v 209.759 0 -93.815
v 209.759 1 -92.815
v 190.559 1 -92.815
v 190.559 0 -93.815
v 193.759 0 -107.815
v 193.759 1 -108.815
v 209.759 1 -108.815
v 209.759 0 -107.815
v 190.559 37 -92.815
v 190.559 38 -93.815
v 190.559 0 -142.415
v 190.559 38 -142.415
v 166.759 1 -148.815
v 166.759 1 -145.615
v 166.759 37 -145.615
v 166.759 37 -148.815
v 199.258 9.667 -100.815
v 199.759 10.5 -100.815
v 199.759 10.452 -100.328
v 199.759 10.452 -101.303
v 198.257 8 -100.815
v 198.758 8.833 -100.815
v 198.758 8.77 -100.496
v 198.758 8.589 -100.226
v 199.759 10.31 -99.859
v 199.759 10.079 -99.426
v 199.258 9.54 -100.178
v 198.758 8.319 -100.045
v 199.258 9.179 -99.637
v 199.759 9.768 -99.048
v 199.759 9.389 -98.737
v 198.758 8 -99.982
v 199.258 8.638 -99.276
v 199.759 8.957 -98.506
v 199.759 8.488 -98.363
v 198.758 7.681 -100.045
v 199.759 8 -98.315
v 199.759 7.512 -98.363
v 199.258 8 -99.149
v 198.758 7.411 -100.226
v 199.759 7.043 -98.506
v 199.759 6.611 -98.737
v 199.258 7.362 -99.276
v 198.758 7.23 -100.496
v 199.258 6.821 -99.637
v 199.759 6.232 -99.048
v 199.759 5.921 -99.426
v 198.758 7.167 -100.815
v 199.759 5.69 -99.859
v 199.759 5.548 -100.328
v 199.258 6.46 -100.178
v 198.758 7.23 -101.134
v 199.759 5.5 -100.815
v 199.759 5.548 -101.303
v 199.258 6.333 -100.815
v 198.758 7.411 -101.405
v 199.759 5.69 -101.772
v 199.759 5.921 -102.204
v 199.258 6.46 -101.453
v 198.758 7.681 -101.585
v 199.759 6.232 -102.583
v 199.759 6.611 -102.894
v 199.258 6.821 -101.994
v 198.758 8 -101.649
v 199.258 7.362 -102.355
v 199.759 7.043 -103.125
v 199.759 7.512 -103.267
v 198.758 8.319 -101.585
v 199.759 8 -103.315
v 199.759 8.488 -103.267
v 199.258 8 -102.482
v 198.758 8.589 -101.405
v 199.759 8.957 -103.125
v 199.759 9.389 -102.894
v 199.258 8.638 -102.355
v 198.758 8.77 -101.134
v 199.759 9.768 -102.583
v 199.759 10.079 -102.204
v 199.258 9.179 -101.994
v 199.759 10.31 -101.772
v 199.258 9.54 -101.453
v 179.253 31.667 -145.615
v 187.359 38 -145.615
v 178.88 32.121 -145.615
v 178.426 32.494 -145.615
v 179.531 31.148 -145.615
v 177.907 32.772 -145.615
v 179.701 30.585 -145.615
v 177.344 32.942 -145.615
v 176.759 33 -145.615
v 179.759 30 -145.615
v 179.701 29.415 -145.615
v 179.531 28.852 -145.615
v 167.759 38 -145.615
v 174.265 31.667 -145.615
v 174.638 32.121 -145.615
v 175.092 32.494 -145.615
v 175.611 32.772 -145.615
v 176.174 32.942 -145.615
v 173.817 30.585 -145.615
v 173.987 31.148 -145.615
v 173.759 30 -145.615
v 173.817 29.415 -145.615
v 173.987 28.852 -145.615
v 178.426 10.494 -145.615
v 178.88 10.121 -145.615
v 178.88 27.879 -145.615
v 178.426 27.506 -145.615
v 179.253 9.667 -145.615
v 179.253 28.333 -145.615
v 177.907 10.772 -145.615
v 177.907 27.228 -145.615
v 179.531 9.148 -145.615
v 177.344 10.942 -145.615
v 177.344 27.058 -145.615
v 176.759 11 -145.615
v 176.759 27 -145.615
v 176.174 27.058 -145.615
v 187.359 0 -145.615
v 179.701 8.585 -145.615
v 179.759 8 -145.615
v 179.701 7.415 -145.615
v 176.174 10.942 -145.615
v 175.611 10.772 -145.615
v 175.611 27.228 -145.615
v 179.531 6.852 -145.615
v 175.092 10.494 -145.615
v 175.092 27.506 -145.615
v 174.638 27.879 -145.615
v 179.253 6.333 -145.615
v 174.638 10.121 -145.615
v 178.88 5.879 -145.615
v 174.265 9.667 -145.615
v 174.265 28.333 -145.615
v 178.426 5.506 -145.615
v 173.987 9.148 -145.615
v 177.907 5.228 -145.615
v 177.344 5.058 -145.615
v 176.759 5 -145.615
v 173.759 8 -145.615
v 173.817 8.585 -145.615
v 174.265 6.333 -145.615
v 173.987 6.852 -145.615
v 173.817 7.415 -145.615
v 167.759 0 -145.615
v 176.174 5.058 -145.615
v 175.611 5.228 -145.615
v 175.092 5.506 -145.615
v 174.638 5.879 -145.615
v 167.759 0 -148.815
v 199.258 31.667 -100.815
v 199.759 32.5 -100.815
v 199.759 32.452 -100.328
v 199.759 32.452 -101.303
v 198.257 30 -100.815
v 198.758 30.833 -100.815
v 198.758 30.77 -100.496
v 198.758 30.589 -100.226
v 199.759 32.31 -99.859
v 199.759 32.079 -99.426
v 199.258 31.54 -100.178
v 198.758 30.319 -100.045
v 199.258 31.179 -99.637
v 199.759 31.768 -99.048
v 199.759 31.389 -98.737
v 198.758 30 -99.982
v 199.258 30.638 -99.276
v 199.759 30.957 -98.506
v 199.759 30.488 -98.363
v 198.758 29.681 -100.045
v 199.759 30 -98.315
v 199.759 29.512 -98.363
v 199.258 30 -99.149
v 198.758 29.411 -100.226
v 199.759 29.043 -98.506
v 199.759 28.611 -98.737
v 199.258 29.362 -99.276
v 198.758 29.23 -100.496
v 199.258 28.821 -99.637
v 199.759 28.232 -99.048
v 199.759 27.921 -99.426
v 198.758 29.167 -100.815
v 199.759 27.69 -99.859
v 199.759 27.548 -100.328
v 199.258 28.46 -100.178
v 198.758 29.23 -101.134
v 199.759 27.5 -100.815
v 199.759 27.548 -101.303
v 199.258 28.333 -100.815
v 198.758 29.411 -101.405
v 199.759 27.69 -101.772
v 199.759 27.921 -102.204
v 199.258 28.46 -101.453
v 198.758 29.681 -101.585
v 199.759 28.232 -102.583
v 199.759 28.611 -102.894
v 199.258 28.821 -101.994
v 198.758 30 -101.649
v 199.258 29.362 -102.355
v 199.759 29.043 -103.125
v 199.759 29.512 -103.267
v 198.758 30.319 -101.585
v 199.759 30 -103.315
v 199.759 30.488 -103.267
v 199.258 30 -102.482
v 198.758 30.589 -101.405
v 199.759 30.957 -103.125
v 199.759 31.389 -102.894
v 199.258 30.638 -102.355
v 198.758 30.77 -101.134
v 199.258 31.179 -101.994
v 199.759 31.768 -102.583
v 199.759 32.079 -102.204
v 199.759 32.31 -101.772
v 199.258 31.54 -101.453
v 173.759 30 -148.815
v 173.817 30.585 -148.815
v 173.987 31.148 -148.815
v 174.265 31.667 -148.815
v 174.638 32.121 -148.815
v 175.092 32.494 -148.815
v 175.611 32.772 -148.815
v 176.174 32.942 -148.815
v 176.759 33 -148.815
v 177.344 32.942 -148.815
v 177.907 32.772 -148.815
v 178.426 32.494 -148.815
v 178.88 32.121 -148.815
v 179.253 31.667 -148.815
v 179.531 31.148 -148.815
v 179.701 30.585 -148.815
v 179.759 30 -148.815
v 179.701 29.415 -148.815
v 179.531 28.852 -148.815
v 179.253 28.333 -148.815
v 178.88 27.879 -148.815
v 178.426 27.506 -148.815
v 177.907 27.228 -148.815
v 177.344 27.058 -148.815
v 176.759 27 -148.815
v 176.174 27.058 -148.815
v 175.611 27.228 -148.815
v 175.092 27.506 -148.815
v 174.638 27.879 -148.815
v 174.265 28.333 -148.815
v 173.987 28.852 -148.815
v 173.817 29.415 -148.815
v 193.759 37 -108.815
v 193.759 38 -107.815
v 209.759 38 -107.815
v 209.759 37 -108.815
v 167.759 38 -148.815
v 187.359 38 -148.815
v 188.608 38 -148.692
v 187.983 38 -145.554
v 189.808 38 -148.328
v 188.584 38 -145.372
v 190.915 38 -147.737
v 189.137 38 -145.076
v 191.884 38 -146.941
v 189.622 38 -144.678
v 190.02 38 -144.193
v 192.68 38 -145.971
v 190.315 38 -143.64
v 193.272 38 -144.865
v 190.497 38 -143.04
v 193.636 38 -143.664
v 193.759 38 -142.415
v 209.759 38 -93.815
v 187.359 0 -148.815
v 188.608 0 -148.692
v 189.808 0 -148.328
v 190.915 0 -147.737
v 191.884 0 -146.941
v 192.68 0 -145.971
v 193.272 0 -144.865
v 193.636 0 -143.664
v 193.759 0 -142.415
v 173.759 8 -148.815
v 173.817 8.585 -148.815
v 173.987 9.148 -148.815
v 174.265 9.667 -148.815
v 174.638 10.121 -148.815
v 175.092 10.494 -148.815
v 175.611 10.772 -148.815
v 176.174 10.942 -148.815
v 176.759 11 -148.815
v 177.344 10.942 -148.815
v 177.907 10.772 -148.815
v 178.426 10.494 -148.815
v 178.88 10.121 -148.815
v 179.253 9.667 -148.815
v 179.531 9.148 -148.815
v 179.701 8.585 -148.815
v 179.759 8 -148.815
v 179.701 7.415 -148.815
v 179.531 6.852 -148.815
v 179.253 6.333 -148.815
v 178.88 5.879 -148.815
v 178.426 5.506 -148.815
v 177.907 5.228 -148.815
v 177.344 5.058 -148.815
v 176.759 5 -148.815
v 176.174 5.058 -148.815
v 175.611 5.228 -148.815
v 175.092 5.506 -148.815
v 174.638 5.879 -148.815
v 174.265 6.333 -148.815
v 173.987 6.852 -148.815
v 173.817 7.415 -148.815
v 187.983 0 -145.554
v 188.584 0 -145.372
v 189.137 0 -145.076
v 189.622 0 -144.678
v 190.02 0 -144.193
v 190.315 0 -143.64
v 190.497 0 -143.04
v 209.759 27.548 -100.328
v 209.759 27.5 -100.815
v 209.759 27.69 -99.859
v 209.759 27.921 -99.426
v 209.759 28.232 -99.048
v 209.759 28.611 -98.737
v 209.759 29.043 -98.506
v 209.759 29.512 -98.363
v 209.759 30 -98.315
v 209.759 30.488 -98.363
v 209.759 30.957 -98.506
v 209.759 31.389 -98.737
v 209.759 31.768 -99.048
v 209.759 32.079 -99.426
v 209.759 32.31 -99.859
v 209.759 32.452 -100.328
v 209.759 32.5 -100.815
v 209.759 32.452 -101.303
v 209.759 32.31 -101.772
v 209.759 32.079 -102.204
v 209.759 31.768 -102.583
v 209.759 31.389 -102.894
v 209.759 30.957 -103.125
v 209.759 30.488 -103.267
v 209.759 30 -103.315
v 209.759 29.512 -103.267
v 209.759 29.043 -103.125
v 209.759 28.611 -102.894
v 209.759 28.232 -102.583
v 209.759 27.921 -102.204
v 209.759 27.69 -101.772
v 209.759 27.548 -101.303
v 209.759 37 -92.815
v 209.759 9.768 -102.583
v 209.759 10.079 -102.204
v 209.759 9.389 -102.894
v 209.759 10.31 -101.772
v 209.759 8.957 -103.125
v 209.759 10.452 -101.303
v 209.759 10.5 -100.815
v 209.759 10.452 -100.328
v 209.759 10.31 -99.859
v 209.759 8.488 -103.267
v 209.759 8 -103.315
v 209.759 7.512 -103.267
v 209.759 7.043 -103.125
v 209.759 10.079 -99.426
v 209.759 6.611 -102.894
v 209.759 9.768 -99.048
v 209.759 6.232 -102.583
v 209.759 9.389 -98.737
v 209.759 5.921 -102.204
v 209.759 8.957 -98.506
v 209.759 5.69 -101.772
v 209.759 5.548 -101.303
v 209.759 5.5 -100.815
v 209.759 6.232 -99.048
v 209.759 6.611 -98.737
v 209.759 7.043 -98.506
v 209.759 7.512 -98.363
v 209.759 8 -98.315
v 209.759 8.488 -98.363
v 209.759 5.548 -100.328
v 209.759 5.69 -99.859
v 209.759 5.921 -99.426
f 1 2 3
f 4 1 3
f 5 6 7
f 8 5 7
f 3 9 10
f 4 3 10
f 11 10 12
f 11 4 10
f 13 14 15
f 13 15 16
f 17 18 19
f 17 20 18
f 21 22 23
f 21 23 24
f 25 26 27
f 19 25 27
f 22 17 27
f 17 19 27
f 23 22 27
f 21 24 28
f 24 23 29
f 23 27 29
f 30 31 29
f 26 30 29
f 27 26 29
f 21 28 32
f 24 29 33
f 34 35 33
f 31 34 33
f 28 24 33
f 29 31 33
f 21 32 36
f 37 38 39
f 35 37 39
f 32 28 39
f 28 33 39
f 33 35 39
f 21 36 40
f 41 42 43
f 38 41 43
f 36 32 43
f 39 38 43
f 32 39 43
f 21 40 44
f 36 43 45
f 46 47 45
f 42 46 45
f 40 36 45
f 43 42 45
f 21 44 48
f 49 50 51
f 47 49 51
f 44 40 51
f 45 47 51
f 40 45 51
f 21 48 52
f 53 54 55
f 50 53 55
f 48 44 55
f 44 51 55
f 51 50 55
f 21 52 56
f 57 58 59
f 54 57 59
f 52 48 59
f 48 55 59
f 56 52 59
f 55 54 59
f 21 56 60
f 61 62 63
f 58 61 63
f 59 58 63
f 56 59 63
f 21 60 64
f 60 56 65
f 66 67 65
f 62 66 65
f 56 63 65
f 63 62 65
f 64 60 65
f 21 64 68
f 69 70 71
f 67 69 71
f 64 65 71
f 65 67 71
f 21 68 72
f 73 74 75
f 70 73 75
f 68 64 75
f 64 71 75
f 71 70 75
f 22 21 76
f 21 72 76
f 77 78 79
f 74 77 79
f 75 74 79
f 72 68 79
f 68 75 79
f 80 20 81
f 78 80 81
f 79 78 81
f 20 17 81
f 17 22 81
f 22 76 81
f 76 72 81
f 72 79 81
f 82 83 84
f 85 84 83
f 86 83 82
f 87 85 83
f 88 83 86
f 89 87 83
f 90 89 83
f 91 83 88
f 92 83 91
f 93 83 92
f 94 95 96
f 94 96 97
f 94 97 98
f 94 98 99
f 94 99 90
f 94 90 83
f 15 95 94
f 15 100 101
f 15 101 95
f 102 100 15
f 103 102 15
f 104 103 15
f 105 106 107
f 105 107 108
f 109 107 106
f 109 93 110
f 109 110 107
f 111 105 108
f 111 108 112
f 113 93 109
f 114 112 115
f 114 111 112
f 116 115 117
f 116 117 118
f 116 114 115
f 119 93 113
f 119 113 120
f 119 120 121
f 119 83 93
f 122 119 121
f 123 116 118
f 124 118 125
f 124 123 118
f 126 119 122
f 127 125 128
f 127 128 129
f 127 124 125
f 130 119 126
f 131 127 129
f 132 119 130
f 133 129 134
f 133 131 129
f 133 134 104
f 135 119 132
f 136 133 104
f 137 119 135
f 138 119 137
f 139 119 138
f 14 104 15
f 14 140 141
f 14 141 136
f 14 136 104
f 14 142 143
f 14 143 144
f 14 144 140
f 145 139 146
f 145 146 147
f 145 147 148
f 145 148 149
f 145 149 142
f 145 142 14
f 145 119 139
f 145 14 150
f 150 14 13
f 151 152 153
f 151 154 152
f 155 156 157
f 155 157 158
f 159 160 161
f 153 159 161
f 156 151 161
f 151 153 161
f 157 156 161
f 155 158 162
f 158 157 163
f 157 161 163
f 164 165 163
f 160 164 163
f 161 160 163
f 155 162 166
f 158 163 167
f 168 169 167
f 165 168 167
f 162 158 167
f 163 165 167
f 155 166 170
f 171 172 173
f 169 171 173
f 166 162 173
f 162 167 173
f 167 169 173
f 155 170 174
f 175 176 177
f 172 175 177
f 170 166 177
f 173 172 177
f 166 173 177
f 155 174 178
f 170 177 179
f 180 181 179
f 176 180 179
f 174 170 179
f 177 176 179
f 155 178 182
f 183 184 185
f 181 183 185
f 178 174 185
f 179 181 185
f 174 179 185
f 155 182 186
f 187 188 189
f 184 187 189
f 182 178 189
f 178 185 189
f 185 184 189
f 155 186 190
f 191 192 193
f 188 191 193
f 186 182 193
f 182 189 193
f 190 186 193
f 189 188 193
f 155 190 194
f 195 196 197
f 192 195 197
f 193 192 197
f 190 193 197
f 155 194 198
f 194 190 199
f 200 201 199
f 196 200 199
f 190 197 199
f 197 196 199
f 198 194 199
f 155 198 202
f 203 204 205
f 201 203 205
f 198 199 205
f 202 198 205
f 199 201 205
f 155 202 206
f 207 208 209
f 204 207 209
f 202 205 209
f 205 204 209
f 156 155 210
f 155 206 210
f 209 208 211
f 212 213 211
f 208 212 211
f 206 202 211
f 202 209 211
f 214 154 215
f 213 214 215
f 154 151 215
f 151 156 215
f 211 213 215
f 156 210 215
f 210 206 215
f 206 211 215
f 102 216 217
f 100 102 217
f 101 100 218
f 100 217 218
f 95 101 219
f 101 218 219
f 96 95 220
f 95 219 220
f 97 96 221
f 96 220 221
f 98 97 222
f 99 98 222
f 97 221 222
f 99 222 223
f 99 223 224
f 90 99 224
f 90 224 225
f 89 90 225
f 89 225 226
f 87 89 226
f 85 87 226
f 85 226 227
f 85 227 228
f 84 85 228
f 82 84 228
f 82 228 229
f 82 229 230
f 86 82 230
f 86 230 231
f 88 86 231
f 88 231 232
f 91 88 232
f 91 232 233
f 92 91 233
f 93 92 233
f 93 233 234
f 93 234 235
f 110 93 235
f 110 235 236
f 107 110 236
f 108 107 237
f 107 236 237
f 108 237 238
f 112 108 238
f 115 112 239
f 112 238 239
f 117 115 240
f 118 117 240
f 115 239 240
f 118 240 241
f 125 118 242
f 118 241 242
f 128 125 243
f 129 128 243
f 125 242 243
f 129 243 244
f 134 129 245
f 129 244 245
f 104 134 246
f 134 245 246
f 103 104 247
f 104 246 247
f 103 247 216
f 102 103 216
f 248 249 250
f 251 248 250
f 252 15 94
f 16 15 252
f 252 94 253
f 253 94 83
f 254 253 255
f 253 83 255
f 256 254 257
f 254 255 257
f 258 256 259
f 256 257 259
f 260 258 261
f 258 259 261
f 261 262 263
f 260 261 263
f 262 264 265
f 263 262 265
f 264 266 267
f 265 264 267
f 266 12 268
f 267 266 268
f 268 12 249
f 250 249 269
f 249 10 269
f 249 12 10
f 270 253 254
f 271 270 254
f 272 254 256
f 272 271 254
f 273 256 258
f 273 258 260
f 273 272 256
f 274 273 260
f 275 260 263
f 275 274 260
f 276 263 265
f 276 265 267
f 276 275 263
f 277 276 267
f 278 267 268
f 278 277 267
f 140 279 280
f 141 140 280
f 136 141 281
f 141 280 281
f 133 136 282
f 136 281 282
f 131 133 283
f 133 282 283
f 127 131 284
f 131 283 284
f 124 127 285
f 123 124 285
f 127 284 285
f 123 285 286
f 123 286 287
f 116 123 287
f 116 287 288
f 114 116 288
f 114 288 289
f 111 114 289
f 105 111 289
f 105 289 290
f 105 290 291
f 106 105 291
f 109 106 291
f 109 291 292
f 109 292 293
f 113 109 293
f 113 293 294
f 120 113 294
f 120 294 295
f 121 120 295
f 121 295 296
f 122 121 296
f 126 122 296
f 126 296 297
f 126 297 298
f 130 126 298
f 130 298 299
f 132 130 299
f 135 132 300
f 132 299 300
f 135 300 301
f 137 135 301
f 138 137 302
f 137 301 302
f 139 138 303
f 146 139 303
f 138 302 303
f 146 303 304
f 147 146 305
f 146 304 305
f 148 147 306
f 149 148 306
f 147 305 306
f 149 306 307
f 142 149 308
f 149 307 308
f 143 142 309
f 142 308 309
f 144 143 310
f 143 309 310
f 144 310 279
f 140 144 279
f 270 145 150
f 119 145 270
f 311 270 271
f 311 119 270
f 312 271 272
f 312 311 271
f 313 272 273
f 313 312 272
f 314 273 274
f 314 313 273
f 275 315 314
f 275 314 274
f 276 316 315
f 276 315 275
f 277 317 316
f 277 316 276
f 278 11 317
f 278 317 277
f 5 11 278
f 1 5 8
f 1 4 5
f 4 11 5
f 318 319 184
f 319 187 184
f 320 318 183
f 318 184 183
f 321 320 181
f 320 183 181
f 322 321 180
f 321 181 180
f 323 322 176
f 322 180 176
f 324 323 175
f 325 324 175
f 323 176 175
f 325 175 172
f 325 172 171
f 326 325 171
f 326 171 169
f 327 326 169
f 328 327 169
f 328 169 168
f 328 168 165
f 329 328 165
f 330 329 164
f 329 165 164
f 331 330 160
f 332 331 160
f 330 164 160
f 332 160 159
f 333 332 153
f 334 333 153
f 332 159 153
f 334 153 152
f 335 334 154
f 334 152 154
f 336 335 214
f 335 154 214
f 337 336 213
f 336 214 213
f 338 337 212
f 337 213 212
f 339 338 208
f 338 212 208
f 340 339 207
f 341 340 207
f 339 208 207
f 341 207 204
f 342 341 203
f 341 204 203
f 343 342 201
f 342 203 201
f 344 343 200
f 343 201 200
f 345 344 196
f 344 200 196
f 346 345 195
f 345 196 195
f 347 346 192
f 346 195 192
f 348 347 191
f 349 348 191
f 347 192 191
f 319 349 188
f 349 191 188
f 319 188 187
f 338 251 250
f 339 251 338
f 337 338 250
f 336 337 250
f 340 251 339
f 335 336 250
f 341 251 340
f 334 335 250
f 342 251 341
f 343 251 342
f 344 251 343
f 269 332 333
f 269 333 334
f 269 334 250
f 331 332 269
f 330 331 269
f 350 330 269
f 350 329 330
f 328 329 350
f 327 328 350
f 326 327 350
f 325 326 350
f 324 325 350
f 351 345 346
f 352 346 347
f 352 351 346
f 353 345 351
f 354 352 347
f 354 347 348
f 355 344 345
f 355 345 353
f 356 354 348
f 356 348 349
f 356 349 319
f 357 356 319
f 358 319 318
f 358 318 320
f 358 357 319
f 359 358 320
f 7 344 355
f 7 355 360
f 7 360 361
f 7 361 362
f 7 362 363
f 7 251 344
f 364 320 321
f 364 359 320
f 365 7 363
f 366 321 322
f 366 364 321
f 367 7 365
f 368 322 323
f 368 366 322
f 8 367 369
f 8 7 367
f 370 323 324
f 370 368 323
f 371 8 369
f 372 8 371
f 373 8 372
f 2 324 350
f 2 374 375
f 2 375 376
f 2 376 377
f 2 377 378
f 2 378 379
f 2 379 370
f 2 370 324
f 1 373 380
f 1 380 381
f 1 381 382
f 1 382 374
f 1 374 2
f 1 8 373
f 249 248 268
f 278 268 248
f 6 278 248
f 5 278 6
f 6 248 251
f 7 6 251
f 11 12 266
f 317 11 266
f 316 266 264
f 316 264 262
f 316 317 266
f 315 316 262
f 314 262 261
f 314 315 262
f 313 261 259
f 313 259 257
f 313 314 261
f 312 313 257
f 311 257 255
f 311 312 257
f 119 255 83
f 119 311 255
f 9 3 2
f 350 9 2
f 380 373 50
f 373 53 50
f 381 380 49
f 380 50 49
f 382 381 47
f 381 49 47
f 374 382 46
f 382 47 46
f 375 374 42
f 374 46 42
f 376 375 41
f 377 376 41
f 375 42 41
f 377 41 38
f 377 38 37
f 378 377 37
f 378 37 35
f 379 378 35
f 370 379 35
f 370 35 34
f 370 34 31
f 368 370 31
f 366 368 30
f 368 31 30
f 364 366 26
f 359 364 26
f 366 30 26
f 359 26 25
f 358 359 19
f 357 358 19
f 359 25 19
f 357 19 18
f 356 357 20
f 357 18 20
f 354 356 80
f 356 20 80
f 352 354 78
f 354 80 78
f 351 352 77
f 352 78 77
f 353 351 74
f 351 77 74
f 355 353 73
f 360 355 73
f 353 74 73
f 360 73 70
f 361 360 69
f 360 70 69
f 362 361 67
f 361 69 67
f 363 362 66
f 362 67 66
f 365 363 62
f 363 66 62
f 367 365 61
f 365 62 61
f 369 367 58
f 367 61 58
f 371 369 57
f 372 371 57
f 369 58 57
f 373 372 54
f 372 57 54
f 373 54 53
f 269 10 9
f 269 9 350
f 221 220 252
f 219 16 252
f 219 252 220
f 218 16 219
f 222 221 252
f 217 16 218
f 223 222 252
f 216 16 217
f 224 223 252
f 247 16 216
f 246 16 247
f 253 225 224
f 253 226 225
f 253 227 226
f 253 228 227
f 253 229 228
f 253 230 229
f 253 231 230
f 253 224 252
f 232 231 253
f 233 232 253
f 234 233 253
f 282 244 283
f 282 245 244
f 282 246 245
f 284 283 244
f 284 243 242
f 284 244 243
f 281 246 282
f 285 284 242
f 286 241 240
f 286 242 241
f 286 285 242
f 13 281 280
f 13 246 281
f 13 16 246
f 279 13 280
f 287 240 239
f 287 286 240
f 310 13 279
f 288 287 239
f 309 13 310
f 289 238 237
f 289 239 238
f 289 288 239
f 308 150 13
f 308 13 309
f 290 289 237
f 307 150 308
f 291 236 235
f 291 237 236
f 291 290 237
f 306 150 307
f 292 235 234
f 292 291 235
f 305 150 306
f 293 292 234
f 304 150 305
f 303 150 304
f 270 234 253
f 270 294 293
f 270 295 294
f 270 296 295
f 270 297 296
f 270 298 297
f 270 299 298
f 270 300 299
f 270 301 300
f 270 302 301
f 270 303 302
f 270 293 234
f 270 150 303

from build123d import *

# Parameters (mm, degrees)
F1_DEPTH = 38
F0_W     = 16
F0_H     = 16
F2_DEPTH = 38
F4_D     = 5
F4_DEPTH = 10
F4_TIP   = 1.5021515476
F6_D     = 6
F7_SIZE  = 1
F8_SIZE  = 1


with BuildPart() as f1:
    # F0 (on Front) → F1 (new body)
    with BuildSketch(Plane.XZ):
        with BuildLine():
            ThreePointArc((187.358939, -148.81538), (191.8844223996, -146.9408633996), (193.758939, -142.41538))
            Line((193.758939, -142.41538), (193.758939, -108.81538))
            Line((193.758939, -108.81538), (193.758939, -92.81538))
            Line((193.758939, -92.81538), (190.558939, -92.81538))
            Line((190.558939, -92.81538), (190.558939, -142.41538))
            ThreePointArc((190.558939, -142.41538), (189.6216806998, -144.6781216998), (187.358939, -145.61538))
            Line((187.358939, -145.61538), (166.758939, -145.61538))
            Line((166.758939, -145.61538), (166.758939, -148.81538))
            Line((166.758939, -148.81538), (187.358939, -148.81538))
        make_face()
    extrude(amount=-F1_DEPTH)

    # F0 (on Front) → F2 (join)
    with BuildSketch(Plane.XZ):
        with Locations((201.758939, -100.81538)):
            Rectangle(F0_W, F0_H)
    extrude(amount=-F2_DEPTH)

    # F4
    with Locations(Plane.YZ.offset(209.758939)):
        with Locations((8, -100.81538), (30, -100.81538)):
            Hole(F4_D / 2, depth=F4_DEPTH)
            with Locations((0, 0, -(F4_DEPTH + F4_TIP / 2))):  # 118° drill point
                Cone(0, F4_D / 2, F4_TIP, mode=Mode.SUBTRACT)

    # F6 (through all)
    with Locations(Plane.XY.offset(-145.61538)):
        with Locations((176.758939, 30), (176.758939, 8)):
            Hole(F6_D / 2)

    # F7
    f7_edges = [f1.edges().sort_by_distance(p)[0] for p in [
        (166.758939, 0, -147.21538),
        (166.758939, 38, -147.21538),
    ]]
    chamfer(f7_edges, length=F7_SIZE)

    # F8
    f8_edges = [f1.edges().sort_by_distance(p)[0] for p in [
        (200.158939, 0, -92.81538),
        (200.158939, 38, -92.81538),
        (201.758939, 38, -108.81538),
        (201.758939, 0, -108.81538),
    ]]
    chamfer(f8_edges, length=F8_SIZE)


solid = f1.part
